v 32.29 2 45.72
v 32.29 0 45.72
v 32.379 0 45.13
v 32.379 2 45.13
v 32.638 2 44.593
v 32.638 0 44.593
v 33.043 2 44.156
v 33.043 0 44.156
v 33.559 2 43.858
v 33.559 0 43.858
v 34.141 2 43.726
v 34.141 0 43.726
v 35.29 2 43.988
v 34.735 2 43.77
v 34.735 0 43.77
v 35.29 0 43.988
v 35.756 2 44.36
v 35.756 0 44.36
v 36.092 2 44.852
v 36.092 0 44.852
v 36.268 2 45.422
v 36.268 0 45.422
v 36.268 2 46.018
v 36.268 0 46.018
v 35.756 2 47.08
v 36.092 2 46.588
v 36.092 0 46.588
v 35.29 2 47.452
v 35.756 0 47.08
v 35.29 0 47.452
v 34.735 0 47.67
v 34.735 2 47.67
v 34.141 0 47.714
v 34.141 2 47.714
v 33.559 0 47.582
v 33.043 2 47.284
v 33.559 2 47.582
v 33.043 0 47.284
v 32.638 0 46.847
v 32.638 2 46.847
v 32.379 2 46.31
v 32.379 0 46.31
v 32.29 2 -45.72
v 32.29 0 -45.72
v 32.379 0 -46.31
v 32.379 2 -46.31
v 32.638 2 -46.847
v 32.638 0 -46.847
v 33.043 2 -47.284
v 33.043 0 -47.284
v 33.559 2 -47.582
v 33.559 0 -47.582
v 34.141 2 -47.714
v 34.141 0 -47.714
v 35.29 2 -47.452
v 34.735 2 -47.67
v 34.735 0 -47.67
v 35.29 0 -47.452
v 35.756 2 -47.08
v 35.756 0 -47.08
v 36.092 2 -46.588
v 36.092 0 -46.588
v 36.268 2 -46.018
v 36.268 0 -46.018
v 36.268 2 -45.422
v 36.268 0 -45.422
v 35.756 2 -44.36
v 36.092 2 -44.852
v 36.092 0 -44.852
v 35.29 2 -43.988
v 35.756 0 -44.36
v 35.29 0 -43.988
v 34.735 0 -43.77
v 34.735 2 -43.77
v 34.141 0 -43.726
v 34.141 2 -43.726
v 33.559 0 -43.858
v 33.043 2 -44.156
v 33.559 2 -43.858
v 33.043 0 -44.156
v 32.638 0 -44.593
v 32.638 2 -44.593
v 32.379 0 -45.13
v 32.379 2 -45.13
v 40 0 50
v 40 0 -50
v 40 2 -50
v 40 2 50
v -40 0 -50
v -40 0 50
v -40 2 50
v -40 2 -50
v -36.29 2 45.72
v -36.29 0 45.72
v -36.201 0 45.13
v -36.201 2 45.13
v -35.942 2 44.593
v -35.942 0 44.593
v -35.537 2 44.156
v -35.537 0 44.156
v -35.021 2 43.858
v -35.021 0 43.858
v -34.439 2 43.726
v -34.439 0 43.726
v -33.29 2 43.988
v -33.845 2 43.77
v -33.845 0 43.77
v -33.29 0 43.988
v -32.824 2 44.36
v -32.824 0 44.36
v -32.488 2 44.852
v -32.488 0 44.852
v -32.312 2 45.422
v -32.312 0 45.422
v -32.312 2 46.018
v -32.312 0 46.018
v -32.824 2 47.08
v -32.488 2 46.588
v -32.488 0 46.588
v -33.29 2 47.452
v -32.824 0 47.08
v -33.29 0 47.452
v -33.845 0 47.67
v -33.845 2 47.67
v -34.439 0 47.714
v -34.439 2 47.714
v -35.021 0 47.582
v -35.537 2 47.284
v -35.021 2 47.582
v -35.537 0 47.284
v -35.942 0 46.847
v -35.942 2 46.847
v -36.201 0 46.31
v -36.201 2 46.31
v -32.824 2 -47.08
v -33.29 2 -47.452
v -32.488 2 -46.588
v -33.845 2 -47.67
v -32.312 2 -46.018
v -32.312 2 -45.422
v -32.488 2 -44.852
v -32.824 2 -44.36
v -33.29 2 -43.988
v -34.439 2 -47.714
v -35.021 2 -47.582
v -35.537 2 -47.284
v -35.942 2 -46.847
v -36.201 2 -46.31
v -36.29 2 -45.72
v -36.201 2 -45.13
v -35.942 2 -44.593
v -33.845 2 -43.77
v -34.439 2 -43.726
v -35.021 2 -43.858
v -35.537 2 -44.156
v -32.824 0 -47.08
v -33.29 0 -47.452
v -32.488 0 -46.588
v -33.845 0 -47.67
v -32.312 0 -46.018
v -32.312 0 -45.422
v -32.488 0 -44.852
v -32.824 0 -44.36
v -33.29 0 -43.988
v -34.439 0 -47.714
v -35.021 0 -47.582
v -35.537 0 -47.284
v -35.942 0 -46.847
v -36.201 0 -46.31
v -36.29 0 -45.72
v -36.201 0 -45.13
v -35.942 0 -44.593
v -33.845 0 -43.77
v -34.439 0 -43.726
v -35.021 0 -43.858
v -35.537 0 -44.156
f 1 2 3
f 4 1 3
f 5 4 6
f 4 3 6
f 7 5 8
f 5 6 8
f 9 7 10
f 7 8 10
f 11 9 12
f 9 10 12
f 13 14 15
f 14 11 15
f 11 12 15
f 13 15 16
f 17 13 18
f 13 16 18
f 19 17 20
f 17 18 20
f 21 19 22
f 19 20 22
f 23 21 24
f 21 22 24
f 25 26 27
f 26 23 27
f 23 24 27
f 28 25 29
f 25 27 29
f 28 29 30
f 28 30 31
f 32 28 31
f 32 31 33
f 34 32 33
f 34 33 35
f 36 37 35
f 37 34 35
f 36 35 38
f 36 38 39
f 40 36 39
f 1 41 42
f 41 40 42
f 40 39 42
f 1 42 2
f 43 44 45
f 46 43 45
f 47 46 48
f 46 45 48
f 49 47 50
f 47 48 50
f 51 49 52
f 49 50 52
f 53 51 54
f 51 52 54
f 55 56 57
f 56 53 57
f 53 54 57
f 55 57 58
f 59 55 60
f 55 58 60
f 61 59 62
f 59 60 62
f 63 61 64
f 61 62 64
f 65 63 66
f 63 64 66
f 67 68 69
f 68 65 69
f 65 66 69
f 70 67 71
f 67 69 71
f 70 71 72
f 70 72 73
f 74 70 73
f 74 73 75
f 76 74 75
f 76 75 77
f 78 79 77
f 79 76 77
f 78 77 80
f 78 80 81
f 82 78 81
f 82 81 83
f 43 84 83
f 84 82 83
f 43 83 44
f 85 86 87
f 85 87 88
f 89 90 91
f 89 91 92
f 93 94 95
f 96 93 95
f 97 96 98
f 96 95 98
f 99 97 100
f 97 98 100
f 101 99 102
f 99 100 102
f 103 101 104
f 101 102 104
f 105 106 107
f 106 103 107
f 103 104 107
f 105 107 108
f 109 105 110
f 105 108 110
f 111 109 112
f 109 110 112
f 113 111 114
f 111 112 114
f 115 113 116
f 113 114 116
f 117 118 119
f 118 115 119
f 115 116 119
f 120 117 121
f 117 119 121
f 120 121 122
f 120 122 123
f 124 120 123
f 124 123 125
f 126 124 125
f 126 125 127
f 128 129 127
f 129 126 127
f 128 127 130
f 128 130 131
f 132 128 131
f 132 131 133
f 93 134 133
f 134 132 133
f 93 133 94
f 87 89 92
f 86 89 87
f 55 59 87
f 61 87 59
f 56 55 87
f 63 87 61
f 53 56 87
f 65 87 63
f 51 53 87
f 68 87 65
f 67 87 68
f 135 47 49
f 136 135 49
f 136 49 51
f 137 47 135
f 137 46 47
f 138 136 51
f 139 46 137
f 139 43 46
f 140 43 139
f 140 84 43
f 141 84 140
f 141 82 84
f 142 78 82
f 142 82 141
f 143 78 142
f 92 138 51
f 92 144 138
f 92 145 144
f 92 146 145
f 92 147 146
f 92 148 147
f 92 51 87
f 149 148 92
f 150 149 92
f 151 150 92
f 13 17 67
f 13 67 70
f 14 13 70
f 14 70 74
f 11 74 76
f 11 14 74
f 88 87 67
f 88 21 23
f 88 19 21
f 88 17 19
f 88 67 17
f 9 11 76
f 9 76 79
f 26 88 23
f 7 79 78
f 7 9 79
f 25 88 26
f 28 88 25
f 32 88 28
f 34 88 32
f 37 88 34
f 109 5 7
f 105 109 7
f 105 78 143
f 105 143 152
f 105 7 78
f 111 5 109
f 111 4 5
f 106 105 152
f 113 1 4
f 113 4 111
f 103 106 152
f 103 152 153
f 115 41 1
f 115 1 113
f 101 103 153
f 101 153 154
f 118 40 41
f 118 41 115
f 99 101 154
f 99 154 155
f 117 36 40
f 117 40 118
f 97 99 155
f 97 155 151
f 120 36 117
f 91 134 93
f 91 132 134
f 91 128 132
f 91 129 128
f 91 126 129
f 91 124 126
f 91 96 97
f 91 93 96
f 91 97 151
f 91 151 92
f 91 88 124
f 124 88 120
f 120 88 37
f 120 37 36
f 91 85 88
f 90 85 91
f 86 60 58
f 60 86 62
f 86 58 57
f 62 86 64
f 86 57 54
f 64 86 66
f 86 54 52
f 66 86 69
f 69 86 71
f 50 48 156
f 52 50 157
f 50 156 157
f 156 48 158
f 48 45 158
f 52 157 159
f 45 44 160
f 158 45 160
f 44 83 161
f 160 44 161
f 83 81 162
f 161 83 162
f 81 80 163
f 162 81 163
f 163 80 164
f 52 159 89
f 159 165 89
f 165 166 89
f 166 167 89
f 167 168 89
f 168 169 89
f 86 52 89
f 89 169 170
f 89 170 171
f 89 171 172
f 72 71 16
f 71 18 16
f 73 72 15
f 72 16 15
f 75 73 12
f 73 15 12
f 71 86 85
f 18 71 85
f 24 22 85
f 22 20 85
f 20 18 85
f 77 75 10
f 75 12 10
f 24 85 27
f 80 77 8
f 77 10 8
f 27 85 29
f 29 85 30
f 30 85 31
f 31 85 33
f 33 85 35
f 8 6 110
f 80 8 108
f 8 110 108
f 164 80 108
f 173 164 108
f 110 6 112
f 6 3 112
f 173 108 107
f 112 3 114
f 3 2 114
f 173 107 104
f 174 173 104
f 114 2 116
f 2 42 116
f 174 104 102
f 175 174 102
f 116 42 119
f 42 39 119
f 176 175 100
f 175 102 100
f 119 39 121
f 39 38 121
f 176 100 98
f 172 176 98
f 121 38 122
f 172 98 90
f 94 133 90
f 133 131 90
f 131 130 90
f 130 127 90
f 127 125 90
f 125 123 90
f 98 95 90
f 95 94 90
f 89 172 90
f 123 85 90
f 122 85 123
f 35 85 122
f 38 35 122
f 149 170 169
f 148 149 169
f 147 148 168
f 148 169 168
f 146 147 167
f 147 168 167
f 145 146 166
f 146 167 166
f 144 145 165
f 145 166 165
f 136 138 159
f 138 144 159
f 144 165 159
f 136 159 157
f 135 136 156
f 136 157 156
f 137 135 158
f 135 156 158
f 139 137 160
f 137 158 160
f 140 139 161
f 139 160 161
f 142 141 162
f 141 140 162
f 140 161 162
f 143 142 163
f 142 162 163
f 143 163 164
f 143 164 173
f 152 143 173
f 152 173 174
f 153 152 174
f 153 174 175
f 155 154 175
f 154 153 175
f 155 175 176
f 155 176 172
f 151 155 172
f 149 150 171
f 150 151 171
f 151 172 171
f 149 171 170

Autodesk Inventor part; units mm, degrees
ref_plane "YZ Plane" through (0, 0, 0) normal (1, 0, 0) x (0, 1, 0)
ref_plane "XZ Plane" through (0, 0, 0) normal (0, 1, 0) x (-1, 0, 0)
ref_plane "XY Plane" through (0, 0, 0) normal (0, 0, 1) x (1, 0, 0)
sketch "Sketch1" plane through (0, 0, 0) normal (0, 1, 0) x (-1, 0, 0)
  line L0 (-40, 50) -> (40, 50)
  line L1 (40, 50) -> (40, -50)
  line L2 (40, -50) -> (-40, -50)
  line L3 (-40, -50) -> (-40, 50)
  line L4 (-40, 50) -> (40, -50) construction
  line L5 (40, 50) -> (-40, -50) construction
  circle A0 centre (34.29, 45.72) radius 2
  line L6 (-34.29, 45.72) -> (34.29, 45.72) construction
  line L7 (34.29, 45.72) -> (34.29, -45.72) construction
  line L8 (34.29, -45.72) -> (-34.29, -45.72) construction
  line L9 (-34.29, -45.72) -> (-34.29, 45.72) construction
  line L10 (-34.29, 45.72) -> (34.29, -45.72) construction
  line L11 (34.29, 45.72) -> (-34.29, -45.72) construction
  circle A1 centre (34.29, -45.72) radius 2
  circle A2 centre (-34.29, -45.72) radius 2
  circle A3 centre (-34.29, 45.72) radius 2
  point P0 (0, 0)
  dimension "d0" = 100
  dimension "d1" = 80
  dimension "d2" = 4
  dimension "d15" = 91.44
  dimension "d16" = 68.58
  dimension "d17" = 4
  dimension "d18" = 4
  dimension "d19" = 4
extrude "Extrusion1" add sketch "Sketch1" along normal blind 2
properties part number "PCB" material "ABS Plastic"
